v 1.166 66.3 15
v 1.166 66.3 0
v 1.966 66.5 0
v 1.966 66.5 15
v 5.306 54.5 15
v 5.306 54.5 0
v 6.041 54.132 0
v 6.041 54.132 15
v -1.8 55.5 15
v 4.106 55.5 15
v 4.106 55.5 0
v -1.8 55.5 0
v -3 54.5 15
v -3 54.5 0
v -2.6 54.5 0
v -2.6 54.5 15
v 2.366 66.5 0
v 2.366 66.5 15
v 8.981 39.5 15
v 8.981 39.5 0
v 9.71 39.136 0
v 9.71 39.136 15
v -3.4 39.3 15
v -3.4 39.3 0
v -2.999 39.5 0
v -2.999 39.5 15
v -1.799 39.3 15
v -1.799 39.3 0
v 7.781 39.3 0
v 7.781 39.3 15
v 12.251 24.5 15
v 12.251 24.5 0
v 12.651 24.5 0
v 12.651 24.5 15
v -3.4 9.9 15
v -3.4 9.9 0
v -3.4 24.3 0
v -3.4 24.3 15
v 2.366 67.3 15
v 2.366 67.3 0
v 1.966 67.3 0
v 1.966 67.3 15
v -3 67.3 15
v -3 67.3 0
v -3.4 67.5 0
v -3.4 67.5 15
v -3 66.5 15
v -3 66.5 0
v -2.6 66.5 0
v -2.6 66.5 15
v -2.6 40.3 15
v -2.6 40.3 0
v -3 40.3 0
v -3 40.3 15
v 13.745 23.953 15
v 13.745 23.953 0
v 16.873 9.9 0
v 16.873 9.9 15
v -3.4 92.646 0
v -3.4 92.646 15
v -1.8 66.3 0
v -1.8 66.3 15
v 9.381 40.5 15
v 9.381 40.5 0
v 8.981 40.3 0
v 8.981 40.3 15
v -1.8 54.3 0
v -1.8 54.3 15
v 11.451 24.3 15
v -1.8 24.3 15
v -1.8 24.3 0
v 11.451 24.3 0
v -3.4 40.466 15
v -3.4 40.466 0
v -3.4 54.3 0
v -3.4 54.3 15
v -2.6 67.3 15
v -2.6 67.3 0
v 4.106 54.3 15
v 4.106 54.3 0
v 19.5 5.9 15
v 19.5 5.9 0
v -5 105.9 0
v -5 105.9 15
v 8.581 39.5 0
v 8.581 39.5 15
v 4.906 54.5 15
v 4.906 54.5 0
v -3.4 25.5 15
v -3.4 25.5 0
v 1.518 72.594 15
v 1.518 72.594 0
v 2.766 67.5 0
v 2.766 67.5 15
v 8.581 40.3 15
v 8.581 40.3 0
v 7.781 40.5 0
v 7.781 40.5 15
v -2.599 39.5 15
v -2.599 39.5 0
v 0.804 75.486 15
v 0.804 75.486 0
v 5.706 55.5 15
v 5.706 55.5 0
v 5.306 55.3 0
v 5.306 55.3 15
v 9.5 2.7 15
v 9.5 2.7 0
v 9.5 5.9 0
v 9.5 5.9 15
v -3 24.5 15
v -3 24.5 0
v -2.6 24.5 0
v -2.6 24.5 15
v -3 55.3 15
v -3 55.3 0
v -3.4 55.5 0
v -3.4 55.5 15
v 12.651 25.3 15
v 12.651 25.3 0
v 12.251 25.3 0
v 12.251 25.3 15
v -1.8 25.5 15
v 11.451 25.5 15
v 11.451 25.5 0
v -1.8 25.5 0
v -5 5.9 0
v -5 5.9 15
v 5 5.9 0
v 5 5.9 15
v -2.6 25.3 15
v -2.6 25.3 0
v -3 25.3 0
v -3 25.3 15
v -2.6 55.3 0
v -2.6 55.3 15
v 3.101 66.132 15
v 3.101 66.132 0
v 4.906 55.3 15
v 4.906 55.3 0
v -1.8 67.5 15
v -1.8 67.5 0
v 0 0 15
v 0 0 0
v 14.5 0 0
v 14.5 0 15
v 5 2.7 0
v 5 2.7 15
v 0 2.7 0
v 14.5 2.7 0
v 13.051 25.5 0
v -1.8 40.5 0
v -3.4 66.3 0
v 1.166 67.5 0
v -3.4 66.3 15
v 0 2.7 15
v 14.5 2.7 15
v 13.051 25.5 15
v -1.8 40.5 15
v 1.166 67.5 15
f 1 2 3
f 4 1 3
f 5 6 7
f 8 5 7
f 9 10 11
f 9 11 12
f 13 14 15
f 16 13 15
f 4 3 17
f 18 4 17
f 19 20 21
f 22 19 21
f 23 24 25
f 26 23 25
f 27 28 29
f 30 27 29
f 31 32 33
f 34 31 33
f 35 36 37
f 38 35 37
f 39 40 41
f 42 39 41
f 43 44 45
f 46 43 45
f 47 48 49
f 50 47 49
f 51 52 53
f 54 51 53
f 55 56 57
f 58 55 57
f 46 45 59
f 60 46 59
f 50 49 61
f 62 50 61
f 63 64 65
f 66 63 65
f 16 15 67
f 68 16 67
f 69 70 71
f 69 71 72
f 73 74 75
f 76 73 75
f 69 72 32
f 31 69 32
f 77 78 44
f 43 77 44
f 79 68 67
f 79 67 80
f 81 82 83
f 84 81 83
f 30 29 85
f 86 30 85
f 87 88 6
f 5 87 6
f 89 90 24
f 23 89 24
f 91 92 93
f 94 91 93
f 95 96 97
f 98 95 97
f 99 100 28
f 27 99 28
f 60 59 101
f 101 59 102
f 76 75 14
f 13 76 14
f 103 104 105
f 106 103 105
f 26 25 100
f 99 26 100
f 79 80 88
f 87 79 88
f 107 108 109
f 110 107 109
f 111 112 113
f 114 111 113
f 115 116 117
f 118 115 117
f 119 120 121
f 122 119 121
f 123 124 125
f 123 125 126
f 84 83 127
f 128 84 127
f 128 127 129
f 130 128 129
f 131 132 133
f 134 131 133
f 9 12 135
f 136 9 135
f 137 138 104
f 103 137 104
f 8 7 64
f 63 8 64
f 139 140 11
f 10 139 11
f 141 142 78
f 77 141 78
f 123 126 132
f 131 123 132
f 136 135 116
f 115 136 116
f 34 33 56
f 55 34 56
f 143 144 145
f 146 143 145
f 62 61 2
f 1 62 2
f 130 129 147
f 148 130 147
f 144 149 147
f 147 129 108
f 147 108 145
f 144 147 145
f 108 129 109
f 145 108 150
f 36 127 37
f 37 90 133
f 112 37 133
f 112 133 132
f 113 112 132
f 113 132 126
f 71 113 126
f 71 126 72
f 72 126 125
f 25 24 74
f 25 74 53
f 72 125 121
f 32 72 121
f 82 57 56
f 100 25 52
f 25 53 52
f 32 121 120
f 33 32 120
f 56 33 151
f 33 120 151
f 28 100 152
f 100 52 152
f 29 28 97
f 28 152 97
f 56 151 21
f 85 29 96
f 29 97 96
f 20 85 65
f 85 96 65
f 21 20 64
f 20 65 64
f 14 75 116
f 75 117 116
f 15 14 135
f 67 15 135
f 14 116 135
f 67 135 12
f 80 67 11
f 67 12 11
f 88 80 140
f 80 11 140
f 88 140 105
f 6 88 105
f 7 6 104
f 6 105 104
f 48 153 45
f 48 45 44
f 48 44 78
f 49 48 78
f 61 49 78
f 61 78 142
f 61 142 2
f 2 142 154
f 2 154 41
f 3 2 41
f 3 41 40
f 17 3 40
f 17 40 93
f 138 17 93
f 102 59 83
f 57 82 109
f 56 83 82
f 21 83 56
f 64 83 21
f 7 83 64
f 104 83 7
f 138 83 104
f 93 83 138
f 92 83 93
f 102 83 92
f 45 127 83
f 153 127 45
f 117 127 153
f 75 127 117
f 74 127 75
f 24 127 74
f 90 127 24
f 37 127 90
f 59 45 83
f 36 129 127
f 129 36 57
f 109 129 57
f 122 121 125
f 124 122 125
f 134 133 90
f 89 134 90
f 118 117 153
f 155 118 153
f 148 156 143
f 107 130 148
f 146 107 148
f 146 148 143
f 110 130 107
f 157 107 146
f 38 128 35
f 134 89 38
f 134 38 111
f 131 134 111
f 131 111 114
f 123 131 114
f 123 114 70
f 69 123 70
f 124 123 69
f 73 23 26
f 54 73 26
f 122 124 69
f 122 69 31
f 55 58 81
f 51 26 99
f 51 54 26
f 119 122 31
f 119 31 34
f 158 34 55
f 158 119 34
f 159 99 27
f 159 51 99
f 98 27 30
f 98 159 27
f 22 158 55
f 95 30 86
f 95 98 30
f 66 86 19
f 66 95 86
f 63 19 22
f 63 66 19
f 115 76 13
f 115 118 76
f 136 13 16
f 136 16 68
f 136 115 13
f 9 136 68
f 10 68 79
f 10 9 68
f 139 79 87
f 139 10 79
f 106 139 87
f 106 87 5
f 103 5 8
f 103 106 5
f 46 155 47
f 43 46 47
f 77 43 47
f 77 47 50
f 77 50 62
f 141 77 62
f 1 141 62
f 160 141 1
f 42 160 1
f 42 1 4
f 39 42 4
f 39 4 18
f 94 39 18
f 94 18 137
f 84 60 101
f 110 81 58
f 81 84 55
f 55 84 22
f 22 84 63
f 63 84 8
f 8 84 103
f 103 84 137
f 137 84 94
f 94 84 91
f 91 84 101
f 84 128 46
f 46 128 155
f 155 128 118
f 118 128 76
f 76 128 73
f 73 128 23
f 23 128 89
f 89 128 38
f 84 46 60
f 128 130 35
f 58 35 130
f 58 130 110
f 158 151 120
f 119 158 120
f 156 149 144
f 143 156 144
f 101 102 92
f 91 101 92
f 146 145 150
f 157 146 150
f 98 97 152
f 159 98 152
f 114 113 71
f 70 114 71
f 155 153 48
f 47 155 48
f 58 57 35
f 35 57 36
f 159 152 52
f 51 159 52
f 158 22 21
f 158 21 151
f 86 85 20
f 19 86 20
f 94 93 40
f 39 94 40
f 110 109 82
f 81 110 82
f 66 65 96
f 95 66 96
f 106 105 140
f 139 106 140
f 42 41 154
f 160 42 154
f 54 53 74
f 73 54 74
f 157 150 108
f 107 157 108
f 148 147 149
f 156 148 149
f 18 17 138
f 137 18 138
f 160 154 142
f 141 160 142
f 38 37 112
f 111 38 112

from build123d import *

# Parameters (mm, degrees)
F1_DEPTH = 15


with BuildPart() as f1:
    # F0 (on Top) → F1 (new body)
    with BuildSketch(Plane.XY):
        Polygon((0, 2.7), (0, 0), (14.5, 0), (14.5, 2.7), (9.5, 2.7), (9.5, 5.9), (19.5, 5.9), (-5, 105.9), (-5, 5.9), (5, 5.9), (5, 2.7), align=None)
        Polygon((16.87268, 9.9), (-3.4, 9.9), (-3.4, 23.06697), (-3.4, 24.3), (-3, 24.5), (-2.6, 24.5), (-1.8, 24.3), (11.45068, 24.3), (12.25068, 24.5), (12.65068, 24.5), (13.745434, 23.952623), align=None, mode=Mode.SUBTRACT)
        Polygon((8.981001, 39.5), (9.70998, 39.135511), (13.05068, 25.5), (12.65068, 25.3), (12.25068, 25.3), (11.45068, 25.5), (-1.8, 25.5), (-2.6, 25.3), (-3, 25.3), (-3.4, 25.5), (-3.4, 26.733285), (-3.4, 39.299999), (-2.998656, 39.5), (-2.598656, 39.5), (-1.798656, 39.3), (7.781001, 39.3), (8.581001, 39.5), align=None, mode=Mode.SUBTRACT)
        Polygon((5.306001, 54.5), (6.041044, 54.132479), (9.381001, 40.5), (8.981001, 40.3), (8.581001, 40.3), (7.781001, 40.5), (-1.8, 40.5), (-2.6, 40.3), (-3, 40.3), (-3.4, 40.466429), (-3.4, 54.3), (-3, 54.5), (-2.6, 54.5), (-1.8, 54.3), (4.106001, 54.3), (4.906001, 54.5), align=None, mode=Mode.SUBTRACT)
        Polygon((2.366001, 66.5), (3.101044, 66.132479), (5.706001, 55.5), (5.306001, 55.3), (4.906001, 55.3), (4.106001, 55.5), (-1.8, 55.5), (-2.6, 55.3), (-3, 55.3), (-3.4, 55.5), (-3.4, 66.3), (-3, 66.5), (-2.6, 66.5), (-1.8, 66.3), (1.166001, 66.3), (1.966001, 66.5), align=None, mode=Mode.SUBTRACT)
        Polygon((-3.4, 75.38324), (-3.4, 92.645632), (0.804118, 75.485968), (1.518031, 72.593754), (2.766001, 67.5), (2.366001, 67.3), (1.966001, 67.3), (1.166001, 67.5), (-1.8, 67.5), (-2.6, 67.3), (-3, 67.3), (-3.4, 67.5), (-3.4, 72.41676), align=None, mode=Mode.SUBTRACT)
    extrude(amount=F1_DEPTH)


solid = f1.part
